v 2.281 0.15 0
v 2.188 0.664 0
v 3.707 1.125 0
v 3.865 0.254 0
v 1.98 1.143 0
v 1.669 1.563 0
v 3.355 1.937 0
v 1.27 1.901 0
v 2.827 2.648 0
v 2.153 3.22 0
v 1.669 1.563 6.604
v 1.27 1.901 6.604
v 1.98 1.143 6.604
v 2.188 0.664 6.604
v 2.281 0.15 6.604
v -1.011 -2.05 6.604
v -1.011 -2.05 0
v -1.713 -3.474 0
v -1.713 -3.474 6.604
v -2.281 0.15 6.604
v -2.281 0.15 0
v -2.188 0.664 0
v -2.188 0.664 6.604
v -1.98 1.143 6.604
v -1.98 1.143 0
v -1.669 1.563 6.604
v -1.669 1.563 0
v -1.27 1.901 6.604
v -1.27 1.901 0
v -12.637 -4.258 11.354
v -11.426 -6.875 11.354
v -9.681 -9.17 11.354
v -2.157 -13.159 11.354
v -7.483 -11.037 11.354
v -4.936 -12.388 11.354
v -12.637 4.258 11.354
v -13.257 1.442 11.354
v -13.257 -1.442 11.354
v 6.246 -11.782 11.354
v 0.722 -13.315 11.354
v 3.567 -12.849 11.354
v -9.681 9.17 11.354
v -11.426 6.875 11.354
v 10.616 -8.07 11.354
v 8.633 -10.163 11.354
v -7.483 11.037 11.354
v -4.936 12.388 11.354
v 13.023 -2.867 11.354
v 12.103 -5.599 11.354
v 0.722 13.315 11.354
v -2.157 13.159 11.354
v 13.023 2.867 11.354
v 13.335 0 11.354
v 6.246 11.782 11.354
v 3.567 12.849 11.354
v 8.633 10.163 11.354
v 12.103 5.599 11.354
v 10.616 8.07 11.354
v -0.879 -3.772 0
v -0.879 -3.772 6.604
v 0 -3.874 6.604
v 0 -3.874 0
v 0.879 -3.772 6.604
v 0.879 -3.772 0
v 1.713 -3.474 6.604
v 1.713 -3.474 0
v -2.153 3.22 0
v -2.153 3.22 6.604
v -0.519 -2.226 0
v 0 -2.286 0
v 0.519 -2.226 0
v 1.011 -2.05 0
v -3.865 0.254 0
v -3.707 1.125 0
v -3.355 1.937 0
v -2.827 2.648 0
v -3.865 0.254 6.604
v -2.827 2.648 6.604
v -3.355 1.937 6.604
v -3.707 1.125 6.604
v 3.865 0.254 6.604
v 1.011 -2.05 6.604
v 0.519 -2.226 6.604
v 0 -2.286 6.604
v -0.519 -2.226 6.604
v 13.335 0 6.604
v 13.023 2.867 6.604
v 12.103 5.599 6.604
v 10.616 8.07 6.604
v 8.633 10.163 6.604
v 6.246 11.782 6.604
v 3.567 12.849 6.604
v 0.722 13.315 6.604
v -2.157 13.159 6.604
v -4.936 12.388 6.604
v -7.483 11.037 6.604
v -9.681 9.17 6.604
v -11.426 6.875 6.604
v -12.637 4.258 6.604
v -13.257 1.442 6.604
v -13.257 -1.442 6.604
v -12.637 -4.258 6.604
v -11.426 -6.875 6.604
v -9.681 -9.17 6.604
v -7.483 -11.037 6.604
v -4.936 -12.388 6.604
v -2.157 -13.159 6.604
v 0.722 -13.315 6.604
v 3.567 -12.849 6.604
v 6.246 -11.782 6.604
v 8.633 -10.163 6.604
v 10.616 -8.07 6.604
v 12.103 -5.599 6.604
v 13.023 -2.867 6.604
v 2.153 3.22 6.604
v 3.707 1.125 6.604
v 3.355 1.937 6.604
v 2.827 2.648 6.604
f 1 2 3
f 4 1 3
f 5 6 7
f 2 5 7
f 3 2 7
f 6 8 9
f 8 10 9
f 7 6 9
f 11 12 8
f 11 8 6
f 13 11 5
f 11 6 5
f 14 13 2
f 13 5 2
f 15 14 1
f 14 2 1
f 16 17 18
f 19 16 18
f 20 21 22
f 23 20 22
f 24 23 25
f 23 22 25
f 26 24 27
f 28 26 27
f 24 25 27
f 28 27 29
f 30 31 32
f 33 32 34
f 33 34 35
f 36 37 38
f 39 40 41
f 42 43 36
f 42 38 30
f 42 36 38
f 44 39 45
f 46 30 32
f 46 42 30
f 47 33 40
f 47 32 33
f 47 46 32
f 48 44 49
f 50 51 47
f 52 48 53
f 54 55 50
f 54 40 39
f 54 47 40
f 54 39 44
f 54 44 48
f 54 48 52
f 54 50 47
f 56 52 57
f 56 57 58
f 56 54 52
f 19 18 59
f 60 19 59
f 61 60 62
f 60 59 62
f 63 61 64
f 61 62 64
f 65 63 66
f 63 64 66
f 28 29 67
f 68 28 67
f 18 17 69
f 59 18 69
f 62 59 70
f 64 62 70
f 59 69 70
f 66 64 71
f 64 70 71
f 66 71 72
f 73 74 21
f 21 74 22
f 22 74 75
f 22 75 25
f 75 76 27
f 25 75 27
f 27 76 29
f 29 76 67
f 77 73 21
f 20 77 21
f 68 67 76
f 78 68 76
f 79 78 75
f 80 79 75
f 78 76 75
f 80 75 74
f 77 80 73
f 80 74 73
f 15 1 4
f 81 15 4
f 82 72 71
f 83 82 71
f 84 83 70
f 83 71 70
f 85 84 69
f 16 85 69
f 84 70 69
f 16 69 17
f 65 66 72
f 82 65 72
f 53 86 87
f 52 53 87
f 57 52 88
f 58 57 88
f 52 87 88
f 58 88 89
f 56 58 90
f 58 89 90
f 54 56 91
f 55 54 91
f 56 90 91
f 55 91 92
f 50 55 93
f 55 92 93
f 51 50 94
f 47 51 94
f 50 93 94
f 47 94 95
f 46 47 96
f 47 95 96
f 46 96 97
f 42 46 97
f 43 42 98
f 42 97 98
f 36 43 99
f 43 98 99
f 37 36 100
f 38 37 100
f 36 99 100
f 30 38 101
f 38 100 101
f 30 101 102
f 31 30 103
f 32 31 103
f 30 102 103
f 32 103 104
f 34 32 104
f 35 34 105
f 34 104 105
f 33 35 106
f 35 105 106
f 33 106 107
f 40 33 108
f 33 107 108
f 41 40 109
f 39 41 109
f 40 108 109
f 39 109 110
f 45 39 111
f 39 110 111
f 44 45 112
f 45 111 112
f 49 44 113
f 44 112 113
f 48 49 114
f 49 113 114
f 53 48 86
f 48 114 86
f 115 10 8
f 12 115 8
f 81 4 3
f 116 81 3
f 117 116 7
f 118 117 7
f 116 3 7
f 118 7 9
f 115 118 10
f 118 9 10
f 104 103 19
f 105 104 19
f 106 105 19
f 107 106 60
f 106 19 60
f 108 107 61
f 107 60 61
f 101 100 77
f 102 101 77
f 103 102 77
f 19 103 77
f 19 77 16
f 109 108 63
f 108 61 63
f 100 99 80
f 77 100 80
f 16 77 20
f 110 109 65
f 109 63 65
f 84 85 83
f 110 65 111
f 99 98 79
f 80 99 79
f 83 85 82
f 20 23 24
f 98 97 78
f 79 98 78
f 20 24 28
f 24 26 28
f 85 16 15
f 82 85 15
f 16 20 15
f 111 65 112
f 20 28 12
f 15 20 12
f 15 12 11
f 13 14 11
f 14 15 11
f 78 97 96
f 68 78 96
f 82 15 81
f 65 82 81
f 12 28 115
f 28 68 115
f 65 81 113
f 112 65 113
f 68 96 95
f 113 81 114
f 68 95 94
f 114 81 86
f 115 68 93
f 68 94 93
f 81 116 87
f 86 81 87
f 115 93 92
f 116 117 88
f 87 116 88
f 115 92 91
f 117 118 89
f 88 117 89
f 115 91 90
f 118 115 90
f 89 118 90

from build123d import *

# Parameters (mm, degrees)
F1_DEPTH = 6.604
F2_R     = 13.335
F3_DEPTH = 4.7498
F4_R     = 2.286
F5_DEPTH = 6.604


with BuildPart() as f1:
    # F0 (on Top) → F1 (new body)
    with BuildSketch(Plane.XY):
        with BuildLine():
            ThreePointArc((-1.712611, -3.474329), (0, -3.8735), (1.712611, -3.474329))
            Line((1.712611, -3.474329), (0.898419, -1.822599))
            ThreePointArc((0.898419, -1.822599), (0, -2.032), (-0.898419, -1.822599))
            Line((-0.898419, -1.822599), (-1.712611, -3.474329))
        make_face()
        with BuildLine():
            Line((-1.129208, 1.689353), (-2.152552, 3.220329))
            ThreePointArc((-2.152552, 3.220329), (-3.354549, 1.93675), (-3.865163, 0.254))
            Line((-3.865163, 0.254), (-2.027627, 0.133246))
            ThreePointArc((-2.027627, 0.133246), (-1.759764, 1.016), (-1.129208, 1.689353))
        make_face()
        with BuildLine():
            Line((2.027627, 0.133246), (3.865163, 0.254))
            ThreePointArc((3.865163, 0.254), (3.354549, 1.93675), (2.152552, 3.220329))
            Line((2.152552, 3.220329), (1.129208, 1.689353))
            ThreePointArc((1.129208, 1.689353), (1.759764, 1.016), (2.027627, 0.133246))
        make_face()
        with BuildLine():
            ThreePointArc((2.027627, -0.133246), (2.030906, -0.066659), (2.032, 0))
            ThreePointArc((2.032, 0), (2.030906, 0.066659), (2.027627, 0.133246))
            ThreePointArc((2.027627, 0.133246), (1.759764, 1.016), (1.129208, 1.689353))
            ThreePointArc((1.129208, 1.689353), (1.016, 1.759764), (0.898419, 1.822599))
            ThreePointArc((0.898419, 1.822599), (0, 2.032), (-0.898419, 1.822599))
            ThreePointArc((-0.898419, 1.822599), (-1.016, 1.759764), (-1.129208, 1.689353))
            ThreePointArc((-1.129208, 1.689353), (-1.759764, 1.016), (-2.027627, 0.133246))
            ThreePointArc((-2.027627, 0.133246), (-2.032, 0), (-2.027627, -0.133246))
            ThreePointArc((-2.027627, -0.133246), (-1.759764, -1.016), (-1.129208, -1.689353))
            ThreePointArc((-1.129208, -1.689353), (-1.016, -1.759764), (-0.898419, -1.822599))
            ThreePointArc((-0.898419, -1.822599), (0, -2.032), (0.898419, -1.822599))
            ThreePointArc((0.898419, -1.822599), (1.016, -1.759764), (1.129208, -1.689353))
            ThreePointArc((1.129208, -1.689353), (1.759764, -1.016), (2.027627, -0.133246))
        make_face()
    extrude(amount=F1_DEPTH)

    # F2 (on face) → F3 (join)
    with BuildSketch(Plane.XY.offset(6.604)):
        Circle(F2_R)
    extrude(amount=F3_DEPTH)

    # F4 (on face) → F5 (cut, through all)
    with BuildSketch(Plane(origin=(0, 0, 0), x_dir=(1, 0, 0), z_dir=(0, 0, -1))):
        Circle(F4_R)
    extrude(amount=-F5_DEPTH, mode=Mode.SUBTRACT)


solid = f1.part
